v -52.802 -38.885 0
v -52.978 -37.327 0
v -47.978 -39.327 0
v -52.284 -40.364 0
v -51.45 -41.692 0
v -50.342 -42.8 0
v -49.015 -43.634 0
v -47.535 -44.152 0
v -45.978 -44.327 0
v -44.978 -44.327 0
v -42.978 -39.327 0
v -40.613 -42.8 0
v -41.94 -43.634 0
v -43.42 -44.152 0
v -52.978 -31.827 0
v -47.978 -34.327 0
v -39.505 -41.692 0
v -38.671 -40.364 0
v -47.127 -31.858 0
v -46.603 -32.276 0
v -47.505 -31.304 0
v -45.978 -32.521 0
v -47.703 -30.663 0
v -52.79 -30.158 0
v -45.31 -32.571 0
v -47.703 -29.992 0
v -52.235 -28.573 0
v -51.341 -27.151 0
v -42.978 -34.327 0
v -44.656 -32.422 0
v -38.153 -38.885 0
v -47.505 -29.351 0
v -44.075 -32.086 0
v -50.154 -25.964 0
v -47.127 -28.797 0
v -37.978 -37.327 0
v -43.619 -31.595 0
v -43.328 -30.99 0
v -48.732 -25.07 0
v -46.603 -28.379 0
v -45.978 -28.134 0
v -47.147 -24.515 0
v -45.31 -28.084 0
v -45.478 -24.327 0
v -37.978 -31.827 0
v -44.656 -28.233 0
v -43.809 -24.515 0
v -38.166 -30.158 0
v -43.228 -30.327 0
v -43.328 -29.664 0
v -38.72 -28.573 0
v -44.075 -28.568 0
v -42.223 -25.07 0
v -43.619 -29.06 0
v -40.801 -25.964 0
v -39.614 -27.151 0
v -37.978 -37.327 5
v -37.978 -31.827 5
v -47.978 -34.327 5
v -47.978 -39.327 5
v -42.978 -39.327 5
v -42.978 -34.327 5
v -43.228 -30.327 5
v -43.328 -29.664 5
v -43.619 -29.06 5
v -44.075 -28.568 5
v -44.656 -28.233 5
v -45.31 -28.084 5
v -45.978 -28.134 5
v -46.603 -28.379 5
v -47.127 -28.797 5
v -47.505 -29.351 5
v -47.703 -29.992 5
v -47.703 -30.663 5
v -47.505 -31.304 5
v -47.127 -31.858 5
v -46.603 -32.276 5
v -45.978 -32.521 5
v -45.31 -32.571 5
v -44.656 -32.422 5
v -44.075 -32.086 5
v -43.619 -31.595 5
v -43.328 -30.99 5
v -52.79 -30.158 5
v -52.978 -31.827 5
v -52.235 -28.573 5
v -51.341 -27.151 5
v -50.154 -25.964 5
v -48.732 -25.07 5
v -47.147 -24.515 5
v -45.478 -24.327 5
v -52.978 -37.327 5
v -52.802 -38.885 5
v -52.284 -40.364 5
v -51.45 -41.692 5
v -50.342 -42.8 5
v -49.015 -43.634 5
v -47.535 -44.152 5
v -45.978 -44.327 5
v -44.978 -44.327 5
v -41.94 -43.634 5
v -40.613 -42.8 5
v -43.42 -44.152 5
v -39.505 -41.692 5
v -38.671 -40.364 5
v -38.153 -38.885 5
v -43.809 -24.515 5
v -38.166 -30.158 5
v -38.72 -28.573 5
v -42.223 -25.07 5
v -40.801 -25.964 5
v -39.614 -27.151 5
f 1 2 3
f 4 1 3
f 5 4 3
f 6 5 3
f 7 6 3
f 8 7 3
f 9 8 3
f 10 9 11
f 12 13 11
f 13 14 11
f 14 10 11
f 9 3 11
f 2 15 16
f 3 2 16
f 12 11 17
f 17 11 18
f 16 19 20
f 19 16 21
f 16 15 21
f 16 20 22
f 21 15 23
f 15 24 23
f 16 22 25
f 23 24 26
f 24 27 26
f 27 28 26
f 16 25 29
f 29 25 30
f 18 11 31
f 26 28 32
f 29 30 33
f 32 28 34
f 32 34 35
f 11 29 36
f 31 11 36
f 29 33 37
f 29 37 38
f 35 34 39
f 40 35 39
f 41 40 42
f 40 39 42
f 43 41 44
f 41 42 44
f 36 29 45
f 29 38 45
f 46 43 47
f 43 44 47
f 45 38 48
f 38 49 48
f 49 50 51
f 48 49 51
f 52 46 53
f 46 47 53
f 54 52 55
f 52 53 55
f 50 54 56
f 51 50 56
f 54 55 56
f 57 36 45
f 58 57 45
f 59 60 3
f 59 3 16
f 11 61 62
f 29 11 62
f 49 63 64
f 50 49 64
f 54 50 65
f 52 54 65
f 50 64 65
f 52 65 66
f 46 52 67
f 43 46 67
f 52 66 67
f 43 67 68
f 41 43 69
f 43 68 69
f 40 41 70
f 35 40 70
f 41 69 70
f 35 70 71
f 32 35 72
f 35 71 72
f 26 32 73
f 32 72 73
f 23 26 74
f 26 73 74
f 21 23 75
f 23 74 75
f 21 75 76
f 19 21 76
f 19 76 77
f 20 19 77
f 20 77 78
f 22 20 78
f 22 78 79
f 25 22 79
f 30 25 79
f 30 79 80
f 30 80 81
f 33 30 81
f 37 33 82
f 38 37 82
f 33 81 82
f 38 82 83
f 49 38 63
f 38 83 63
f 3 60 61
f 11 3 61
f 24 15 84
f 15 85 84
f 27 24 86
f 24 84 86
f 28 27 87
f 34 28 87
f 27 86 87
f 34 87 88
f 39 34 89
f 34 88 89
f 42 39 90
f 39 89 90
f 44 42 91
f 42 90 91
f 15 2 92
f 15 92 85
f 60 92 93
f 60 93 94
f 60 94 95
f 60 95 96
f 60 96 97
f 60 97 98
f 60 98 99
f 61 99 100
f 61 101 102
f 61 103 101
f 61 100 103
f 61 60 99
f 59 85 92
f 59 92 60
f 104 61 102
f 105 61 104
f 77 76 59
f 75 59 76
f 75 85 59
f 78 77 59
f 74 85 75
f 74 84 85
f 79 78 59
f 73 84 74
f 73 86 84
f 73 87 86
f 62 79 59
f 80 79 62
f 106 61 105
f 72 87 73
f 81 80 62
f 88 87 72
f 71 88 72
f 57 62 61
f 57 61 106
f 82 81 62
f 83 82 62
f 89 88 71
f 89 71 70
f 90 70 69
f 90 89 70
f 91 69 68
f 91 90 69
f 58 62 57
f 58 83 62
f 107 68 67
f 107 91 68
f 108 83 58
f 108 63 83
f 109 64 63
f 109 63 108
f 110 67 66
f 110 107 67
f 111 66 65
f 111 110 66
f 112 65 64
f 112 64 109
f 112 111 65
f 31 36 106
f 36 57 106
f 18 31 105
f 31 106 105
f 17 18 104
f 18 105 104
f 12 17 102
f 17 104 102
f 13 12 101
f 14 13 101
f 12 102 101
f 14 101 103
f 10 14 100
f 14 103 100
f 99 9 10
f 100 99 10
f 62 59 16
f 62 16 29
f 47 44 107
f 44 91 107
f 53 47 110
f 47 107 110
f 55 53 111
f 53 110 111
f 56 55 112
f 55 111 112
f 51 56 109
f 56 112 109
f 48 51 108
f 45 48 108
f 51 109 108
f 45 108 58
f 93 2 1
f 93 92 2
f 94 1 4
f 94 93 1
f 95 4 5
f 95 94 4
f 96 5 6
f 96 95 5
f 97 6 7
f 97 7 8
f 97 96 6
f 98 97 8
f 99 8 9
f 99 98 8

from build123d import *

# Parameters (mm, degrees)
ESQUISSE1_W             = 15
ESQUISSE1_H             = 20
BOSS_EXTRU_1_DEPTH      = 5
ESQUISSE2_W             = 5
ESQUISSE2_H             = 5
ESQUISSE2_R             = 2.25
ENL_V_MAT_EXTRU_1_DEPTH = 5
CONG_1_R                = 7.5
CONG_4_R                = 7.5
CONG_5_R                = 7


with BuildPart() as part:
    # Esquisse1 → Boss.-Extru.1 (new body)
    with BuildSketch(Plane.XY):
        with Locations((-45.477663375, -34.327294686)):
            Rectangle(ESQUISSE1_W, ESQUISSE1_H)
    extrude(amount=BOSS_EXTRU_1_DEPTH)

    # Esquisse2 → Enlèv. mat.-Extru.1 (cut)
    with BuildSketch(Plane.XY.offset(5)):
        with Locations((-45.477663375, -36.827294686)):
            Rectangle(ESQUISSE2_W, ESQUISSE2_H)
        with Locations((-45.477663375, -30.327294686)):
            Circle(ESQUISSE2_R)
    extrude(amount=-ENL_V_MAT_EXTRU_1_DEPTH, mode=Mode.SUBTRACT)

    # Congé1
    cong_1_edges = [part.edges().sort_by_distance(p)[0] for p in [
        (-52.977663375, -24.327294686, 2.5),
    ]]
    fillet(cong_1_edges, radius=CONG_1_R)

    # Congé4
    cong_4_edges = [part.edges().sort_by_distance(p)[0] for p in [
        (-37.977663375, -24.327294686, 2.5),
    ]]
    fillet(cong_4_edges, radius=CONG_4_R - 0.0001)  # a hair under: the kernel refuses the full size

    # Congé5
    cong_5_edges = [part.edges().sort_by_distance(p)[0] for p in [
        (-37.977663375, -44.327294686, 2.5),
        (-52.977663375, -44.327294686, 2.5),
    ]]
    fillet(cong_5_edges, radius=CONG_5_R)


solid = part.part
